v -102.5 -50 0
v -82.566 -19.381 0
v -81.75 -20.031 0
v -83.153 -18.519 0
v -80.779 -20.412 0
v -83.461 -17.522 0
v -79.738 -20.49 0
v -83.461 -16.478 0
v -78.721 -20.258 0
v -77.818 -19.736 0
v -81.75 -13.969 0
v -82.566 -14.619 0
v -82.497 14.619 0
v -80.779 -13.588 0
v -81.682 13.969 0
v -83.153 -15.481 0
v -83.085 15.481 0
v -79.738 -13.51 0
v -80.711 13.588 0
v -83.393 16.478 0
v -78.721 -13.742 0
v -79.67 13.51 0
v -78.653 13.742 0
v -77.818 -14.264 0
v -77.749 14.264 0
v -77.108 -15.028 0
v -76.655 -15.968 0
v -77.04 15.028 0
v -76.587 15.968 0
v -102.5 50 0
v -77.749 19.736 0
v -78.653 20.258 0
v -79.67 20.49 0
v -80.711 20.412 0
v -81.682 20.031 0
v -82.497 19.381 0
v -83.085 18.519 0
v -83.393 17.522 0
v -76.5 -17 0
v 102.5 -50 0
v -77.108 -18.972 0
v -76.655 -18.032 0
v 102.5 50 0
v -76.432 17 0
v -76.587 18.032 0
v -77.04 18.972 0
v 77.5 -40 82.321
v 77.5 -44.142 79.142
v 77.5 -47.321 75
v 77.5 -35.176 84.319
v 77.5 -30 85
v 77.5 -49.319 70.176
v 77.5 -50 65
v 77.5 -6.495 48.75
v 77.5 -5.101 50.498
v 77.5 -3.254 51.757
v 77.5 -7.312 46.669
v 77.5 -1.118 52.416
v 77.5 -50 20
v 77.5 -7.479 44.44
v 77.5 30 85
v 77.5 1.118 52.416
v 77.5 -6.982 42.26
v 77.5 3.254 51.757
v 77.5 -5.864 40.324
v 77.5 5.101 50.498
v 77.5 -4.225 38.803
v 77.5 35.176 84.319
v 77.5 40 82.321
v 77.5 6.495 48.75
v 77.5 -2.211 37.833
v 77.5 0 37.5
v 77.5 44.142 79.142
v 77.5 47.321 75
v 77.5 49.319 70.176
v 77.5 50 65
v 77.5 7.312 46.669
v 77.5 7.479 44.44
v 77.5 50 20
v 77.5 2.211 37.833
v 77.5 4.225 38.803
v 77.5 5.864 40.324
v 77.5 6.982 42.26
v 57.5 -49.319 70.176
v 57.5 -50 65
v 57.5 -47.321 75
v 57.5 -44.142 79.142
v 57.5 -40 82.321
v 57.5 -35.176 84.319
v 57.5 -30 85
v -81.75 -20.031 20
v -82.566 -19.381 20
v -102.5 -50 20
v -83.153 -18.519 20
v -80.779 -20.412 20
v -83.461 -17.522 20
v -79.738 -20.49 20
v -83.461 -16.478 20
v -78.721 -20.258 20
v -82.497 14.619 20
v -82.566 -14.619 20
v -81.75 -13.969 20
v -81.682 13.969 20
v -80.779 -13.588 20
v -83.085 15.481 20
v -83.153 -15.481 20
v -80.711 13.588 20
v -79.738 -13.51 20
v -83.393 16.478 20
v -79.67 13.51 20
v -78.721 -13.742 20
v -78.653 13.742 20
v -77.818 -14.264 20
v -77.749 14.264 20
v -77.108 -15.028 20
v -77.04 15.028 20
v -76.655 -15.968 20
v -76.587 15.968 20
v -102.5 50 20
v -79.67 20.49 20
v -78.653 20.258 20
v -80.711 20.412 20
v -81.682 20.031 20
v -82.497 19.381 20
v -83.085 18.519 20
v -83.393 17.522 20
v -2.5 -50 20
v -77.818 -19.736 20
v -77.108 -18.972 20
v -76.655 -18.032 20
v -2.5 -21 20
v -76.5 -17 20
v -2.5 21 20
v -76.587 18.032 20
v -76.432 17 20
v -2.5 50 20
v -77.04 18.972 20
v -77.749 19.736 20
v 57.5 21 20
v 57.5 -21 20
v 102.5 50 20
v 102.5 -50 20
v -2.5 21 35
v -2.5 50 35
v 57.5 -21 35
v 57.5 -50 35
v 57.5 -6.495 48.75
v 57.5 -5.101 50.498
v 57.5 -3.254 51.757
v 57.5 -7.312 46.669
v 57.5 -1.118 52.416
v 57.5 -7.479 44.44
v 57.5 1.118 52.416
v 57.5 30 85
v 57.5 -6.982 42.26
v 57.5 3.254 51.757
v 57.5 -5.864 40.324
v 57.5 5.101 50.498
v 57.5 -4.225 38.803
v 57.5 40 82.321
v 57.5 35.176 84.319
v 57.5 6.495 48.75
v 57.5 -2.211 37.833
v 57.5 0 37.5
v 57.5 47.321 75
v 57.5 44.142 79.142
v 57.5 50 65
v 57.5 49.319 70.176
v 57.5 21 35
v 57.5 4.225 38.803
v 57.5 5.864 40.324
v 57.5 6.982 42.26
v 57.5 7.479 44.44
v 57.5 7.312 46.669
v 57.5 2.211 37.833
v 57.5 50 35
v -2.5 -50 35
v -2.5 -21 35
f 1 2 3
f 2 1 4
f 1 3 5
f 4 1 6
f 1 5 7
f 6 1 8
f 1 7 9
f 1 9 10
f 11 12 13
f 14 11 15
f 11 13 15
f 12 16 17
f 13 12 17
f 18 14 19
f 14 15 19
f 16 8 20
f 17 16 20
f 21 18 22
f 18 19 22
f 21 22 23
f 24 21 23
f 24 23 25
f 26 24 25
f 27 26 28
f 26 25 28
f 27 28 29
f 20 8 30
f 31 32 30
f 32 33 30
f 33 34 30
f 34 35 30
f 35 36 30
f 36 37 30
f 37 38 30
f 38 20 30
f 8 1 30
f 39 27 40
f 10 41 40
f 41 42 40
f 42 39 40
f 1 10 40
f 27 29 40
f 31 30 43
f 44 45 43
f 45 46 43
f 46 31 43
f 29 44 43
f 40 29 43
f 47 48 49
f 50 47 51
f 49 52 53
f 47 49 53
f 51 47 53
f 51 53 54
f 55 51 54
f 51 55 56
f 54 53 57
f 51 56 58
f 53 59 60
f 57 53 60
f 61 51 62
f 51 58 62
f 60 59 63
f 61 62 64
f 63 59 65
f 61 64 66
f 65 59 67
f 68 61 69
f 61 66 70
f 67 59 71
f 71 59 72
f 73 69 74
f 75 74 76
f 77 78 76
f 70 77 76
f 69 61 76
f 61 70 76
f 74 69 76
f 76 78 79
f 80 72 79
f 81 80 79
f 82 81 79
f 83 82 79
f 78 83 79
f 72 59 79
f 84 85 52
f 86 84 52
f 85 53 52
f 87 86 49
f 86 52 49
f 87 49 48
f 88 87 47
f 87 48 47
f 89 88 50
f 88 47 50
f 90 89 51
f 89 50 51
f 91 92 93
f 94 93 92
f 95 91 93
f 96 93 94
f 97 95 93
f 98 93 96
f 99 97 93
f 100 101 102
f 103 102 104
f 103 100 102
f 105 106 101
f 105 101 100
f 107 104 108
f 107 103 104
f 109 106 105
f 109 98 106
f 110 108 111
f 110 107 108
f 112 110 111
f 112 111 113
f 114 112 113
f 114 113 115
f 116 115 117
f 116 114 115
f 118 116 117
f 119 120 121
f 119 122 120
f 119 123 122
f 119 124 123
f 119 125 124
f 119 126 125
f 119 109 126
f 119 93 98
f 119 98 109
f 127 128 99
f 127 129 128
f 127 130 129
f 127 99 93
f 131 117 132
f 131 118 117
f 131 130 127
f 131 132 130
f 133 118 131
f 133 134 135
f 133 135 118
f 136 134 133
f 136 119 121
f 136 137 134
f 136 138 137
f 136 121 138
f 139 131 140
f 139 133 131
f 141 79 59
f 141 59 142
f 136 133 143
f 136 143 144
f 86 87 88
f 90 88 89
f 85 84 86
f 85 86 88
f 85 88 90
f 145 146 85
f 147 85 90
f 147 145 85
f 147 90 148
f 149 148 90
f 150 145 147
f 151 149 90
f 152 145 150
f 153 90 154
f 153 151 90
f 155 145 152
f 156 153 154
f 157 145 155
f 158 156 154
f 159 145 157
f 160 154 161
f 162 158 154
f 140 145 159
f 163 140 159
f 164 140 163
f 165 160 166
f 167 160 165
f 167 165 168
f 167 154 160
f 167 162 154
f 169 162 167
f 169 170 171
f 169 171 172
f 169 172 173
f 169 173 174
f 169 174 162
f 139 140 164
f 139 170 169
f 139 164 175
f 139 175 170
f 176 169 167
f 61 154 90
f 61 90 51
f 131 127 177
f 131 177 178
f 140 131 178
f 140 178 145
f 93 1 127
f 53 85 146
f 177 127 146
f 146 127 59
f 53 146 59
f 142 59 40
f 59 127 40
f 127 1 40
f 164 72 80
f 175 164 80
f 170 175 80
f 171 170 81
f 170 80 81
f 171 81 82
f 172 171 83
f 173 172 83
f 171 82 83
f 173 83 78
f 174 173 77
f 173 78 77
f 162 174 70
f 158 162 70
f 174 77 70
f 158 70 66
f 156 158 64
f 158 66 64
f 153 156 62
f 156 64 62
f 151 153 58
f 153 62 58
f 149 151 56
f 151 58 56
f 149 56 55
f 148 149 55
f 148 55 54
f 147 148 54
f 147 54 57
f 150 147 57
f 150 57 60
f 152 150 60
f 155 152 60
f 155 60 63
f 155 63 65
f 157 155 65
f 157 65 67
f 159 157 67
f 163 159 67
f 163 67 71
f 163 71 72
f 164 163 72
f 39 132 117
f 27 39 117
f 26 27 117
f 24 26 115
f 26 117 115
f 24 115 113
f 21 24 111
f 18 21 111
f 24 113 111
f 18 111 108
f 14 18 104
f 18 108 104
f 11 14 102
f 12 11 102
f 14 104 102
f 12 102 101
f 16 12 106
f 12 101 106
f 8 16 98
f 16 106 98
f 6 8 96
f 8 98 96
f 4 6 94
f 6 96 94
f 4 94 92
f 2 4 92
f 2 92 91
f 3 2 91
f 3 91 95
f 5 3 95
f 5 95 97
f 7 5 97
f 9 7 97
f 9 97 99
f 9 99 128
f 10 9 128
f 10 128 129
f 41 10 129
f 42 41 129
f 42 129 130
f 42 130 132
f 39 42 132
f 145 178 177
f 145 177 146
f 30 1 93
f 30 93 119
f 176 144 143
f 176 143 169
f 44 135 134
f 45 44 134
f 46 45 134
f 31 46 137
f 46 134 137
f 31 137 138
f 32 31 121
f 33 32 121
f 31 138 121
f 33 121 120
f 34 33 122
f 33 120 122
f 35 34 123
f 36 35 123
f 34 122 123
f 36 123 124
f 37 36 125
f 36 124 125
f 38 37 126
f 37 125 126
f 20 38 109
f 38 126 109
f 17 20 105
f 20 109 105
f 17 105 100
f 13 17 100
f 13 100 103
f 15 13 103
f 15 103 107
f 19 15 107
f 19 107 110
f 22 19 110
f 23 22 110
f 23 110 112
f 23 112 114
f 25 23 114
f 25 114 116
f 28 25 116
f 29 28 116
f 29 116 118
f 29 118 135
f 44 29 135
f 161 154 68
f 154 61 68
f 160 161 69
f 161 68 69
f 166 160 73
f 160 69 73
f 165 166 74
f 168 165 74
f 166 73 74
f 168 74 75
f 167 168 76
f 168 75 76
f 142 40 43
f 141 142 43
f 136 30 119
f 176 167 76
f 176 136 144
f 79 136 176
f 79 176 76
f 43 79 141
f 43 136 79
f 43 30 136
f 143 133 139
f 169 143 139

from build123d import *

# Parameters (mm, degrees)
SCHIZZO1_W                   = 205
SCHIZZO1_H                   = 100
ESTRUSIONE_ESTRUSIONE1_DEPTH = 20
FORO_FILETTATO_M8X1_0_1_D    = 7
SCHIZZO6_W                   = 60
SCHIZZO6_H                   = 29
ESTRUSIONE_ESTRUSIONE2_DEPTH = 15
SCHIZZO7_W                   = 20
SCHIZZO7_H                   = 100
ESTRUSIONE_ESTRUSIONE3_DEPTH = 65
SCHIZZO8_R                   = 7.5
TAGLIO_ESTRUSIONE1_DEPTH     = 206.243757518
RACCORDO1_R                  = 20


with BuildPart() as part:
    # Schizzo1 → Estrusione-Estrusione1 (new body)
    with BuildSketch(Plane.XY):
        Rectangle(SCHIZZO1_W, SCHIZZO1_H)
    extrude(amount=ESTRUSIONE_ESTRUSIONE1_DEPTH)

    # Foro filettato M8x1.0-1 (through all)
    with Locations(Plane(origin=(0, 0, 0), x_dir=(-1, 0, 0), z_dir=(0, 0, -1))):
        with Locations((79.93168314, 16.999931365), (80, -17)):
            Hole(FORO_FILETTATO_M8X1_0_1_D / 2)

    # Schizzo6 → Estrusione-Estrusione2 (add)
    with BuildSketch(Plane.XY.offset(20)):
        with Locations((27.5, -35.5)):
            Rectangle(SCHIZZO6_W, SCHIZZO6_H)
        with Locations((27.5, 35.5)):
            Rectangle(SCHIZZO6_W, SCHIZZO6_H)
    extrude(amount=ESTRUSIONE_ESTRUSIONE2_DEPTH)

    # Schizzo7 → Estrusione-Estrusione3 (add)
    with BuildSketch(Plane.XY.offset(20)):
        with Locations((67.5, 0)):
            Rectangle(SCHIZZO7_W, SCHIZZO7_H)
    extrude(amount=ESTRUSIONE_ESTRUSIONE3_DEPTH)

    # Schizzo8 → Taglio-Estrusione1 (cut, through all)
    with BuildSketch(Plane(origin=(77.5, 0, 0), x_dir=(0, 0, -1), z_dir=(1, 0, 0))):
        with Locations((-45, 0)):
            Circle(SCHIZZO8_R)
    extrude(amount=-TAGLIO_ESTRUSIONE1_DEPTH, mode=Mode.SUBTRACT)

    # Raccordo1
    raccordo1_edges = [part.edges().sort_by_distance(p)[0] for p in [
        (67.5, -50, 85),
        (67.5, 50, 85),
    ]]
    fillet(raccordo1_edges, radius=RACCORDO1_R)


solid = part.part
